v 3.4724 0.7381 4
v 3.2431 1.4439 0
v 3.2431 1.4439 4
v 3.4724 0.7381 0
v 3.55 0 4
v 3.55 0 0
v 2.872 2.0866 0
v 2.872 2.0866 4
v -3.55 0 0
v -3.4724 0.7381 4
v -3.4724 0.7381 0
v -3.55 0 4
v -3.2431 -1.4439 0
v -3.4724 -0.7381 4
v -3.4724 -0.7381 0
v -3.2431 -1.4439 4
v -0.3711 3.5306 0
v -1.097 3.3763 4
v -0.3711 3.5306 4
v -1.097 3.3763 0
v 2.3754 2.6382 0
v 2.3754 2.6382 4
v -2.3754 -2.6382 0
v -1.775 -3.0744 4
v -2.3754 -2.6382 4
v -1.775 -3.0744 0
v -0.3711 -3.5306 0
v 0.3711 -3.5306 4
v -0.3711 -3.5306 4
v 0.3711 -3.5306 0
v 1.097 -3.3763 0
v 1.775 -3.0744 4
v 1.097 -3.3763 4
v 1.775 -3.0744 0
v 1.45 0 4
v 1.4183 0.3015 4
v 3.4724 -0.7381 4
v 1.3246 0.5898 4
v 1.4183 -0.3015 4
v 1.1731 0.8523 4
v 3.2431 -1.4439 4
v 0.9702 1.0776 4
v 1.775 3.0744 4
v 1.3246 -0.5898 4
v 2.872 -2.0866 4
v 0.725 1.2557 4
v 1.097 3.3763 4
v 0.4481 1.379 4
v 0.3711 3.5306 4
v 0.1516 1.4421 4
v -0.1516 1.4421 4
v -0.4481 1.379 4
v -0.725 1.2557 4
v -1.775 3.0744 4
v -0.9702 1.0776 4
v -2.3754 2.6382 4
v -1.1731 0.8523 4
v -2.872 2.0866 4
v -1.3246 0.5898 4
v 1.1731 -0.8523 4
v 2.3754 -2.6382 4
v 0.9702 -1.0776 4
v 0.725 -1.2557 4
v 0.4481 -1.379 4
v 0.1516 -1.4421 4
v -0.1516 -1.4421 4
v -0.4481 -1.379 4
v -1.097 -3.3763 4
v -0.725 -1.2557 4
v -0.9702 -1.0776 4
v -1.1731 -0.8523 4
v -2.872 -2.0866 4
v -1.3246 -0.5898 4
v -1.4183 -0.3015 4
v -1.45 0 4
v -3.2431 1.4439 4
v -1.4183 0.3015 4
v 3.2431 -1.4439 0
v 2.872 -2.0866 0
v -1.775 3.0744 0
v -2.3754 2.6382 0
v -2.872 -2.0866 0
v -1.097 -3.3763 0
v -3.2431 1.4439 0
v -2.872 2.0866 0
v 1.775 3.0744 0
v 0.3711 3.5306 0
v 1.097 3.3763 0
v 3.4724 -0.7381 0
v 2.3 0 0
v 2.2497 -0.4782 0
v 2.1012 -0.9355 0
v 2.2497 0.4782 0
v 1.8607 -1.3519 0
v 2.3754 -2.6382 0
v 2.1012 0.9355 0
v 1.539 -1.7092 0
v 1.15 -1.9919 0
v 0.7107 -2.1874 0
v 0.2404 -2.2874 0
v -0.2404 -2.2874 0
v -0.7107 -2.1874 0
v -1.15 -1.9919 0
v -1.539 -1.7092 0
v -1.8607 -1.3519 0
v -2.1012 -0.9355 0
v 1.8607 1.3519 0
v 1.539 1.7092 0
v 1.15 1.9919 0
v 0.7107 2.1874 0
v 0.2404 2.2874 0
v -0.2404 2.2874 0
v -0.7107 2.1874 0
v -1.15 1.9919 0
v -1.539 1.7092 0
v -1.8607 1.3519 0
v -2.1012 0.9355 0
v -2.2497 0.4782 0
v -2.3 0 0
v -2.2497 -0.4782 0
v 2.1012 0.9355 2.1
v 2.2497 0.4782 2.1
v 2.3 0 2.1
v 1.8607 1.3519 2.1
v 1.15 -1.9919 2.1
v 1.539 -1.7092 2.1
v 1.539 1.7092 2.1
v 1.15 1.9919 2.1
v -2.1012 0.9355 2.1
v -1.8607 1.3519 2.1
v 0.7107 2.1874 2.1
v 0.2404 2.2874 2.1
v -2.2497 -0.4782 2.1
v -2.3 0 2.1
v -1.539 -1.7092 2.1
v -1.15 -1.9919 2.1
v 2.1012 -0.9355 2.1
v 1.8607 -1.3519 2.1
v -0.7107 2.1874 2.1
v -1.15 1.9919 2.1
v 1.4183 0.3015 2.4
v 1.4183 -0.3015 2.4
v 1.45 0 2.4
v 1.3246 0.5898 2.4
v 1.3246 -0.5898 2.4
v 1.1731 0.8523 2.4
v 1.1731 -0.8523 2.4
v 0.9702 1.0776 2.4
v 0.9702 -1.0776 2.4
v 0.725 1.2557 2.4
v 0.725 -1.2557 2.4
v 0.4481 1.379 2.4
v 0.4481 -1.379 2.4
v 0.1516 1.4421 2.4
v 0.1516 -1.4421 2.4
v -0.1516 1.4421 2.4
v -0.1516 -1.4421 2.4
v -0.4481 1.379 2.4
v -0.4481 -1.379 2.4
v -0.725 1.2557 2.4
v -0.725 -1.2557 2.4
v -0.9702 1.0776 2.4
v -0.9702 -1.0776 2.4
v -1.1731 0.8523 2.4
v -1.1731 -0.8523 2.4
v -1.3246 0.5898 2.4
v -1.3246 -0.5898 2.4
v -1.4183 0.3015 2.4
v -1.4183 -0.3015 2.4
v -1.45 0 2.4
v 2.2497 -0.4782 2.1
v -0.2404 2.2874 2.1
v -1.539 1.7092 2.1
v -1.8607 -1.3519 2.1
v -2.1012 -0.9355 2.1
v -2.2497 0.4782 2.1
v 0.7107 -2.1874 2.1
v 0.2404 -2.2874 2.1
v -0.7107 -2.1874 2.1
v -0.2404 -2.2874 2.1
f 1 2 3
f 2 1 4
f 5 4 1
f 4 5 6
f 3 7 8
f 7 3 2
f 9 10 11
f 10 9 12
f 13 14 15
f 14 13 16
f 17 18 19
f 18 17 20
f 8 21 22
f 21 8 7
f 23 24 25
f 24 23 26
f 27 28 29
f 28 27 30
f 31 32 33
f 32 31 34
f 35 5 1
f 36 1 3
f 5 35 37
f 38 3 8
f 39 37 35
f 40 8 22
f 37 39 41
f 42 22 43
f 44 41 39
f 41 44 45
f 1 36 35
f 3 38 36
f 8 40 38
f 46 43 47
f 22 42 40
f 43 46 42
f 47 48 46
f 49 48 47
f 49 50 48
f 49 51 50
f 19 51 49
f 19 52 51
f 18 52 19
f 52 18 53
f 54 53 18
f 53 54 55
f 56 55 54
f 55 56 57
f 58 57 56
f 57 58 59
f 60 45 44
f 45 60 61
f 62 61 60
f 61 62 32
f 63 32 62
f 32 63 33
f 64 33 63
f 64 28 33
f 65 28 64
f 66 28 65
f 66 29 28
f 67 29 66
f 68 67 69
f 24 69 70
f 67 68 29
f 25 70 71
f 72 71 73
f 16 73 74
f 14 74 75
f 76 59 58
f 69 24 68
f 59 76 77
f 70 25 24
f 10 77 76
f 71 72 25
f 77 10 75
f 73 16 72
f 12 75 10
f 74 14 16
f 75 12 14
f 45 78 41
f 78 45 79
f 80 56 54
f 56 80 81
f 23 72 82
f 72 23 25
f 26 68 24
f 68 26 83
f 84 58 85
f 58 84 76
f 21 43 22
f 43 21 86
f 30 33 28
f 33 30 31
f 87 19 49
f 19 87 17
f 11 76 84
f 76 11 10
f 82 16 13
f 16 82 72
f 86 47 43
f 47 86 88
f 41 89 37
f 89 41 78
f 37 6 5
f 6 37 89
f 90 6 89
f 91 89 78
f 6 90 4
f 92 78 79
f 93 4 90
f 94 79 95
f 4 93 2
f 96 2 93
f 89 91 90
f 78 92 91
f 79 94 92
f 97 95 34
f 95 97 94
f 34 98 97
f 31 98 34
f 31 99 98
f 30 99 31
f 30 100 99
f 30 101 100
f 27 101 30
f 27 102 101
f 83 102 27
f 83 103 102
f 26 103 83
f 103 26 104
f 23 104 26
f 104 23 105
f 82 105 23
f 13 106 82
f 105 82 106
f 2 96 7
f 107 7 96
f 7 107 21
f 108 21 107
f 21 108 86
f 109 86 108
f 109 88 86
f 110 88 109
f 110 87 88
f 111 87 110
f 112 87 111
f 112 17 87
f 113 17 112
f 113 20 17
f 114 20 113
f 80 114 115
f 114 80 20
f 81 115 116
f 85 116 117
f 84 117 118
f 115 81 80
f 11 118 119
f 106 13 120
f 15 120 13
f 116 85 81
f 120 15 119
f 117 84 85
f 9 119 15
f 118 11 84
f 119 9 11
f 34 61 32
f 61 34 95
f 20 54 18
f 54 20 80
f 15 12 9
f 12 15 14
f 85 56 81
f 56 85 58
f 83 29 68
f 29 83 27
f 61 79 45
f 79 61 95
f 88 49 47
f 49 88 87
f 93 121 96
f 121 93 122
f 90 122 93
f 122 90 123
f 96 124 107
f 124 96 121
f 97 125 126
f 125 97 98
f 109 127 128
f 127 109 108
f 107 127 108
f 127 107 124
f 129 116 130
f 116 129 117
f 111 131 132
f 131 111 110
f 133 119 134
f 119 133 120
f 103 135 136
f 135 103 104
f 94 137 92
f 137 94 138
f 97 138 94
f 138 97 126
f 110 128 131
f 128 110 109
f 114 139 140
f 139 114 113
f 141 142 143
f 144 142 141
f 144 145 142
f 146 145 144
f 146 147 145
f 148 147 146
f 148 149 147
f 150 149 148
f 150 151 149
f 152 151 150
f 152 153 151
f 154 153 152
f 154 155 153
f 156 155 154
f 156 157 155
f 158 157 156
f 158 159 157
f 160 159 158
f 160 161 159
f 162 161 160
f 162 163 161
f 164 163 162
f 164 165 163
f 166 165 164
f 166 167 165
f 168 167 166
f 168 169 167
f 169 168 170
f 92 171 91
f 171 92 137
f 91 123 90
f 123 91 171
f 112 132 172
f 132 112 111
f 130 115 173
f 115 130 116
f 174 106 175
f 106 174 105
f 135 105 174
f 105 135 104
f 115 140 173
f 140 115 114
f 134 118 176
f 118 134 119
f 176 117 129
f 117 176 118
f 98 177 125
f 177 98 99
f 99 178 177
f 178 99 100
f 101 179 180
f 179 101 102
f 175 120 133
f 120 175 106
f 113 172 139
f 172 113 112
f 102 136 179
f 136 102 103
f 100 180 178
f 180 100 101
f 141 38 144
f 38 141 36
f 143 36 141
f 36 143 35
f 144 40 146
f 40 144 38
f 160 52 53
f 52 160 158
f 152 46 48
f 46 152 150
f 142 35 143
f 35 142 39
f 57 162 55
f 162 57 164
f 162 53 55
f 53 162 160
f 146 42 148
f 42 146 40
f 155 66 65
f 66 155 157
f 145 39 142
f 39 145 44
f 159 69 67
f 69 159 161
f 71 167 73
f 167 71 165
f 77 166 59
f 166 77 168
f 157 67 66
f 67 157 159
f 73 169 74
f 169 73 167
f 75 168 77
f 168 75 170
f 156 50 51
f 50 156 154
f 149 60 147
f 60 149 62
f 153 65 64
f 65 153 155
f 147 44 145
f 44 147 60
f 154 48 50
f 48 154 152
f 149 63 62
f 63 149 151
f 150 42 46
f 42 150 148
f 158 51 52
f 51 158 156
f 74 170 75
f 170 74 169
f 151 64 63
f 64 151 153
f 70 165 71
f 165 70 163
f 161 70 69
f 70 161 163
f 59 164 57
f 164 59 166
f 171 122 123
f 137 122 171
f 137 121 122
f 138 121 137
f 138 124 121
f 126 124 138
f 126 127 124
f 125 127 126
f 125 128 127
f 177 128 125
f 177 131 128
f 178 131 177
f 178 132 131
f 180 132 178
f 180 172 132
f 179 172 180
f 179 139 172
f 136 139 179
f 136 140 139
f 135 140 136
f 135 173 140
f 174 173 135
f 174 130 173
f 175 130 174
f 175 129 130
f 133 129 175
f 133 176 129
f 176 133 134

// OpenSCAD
// Receiving for the spacers
// License GNU AFFERO GENERAL PUBLIC LICENSE v3+
// Copyright 2014 Christian Ege <k4230r6@gmail.com>

receiving_z = 1.6;
spacer_d = 4.6;

module spacer_receivings(h=4)  {
		clearing = 0.3;

		receiving_d = spacer_d + 2.5;

		drill = 3.2-clearing;
		height = max(4,h);

		difference() {
			cylinder(h=height, r=receiving_d/2, $fn=30);
			spacer_inner_cutout(h=height);
			translate([0,0,height-(receiving_z)]) #cylinder(h=receiving_z +clearing, r=drill/2, $fn=30);
		}
		// this is to aviod support structures
		translate([0,0,height-(receiving_z +clearing)]) #cylinder(h=clearing, r=spacer_d/2, $fn=30);

}

module spacer_inner_cutout(h=4, clearing = 0.2) {
			height = max(4,h);
			translate([0,0,-clearing]) cylinder(h=height-receiving_z +clearing, r=spacer_d/2, $fn=30);

}

spacer_receivings();
